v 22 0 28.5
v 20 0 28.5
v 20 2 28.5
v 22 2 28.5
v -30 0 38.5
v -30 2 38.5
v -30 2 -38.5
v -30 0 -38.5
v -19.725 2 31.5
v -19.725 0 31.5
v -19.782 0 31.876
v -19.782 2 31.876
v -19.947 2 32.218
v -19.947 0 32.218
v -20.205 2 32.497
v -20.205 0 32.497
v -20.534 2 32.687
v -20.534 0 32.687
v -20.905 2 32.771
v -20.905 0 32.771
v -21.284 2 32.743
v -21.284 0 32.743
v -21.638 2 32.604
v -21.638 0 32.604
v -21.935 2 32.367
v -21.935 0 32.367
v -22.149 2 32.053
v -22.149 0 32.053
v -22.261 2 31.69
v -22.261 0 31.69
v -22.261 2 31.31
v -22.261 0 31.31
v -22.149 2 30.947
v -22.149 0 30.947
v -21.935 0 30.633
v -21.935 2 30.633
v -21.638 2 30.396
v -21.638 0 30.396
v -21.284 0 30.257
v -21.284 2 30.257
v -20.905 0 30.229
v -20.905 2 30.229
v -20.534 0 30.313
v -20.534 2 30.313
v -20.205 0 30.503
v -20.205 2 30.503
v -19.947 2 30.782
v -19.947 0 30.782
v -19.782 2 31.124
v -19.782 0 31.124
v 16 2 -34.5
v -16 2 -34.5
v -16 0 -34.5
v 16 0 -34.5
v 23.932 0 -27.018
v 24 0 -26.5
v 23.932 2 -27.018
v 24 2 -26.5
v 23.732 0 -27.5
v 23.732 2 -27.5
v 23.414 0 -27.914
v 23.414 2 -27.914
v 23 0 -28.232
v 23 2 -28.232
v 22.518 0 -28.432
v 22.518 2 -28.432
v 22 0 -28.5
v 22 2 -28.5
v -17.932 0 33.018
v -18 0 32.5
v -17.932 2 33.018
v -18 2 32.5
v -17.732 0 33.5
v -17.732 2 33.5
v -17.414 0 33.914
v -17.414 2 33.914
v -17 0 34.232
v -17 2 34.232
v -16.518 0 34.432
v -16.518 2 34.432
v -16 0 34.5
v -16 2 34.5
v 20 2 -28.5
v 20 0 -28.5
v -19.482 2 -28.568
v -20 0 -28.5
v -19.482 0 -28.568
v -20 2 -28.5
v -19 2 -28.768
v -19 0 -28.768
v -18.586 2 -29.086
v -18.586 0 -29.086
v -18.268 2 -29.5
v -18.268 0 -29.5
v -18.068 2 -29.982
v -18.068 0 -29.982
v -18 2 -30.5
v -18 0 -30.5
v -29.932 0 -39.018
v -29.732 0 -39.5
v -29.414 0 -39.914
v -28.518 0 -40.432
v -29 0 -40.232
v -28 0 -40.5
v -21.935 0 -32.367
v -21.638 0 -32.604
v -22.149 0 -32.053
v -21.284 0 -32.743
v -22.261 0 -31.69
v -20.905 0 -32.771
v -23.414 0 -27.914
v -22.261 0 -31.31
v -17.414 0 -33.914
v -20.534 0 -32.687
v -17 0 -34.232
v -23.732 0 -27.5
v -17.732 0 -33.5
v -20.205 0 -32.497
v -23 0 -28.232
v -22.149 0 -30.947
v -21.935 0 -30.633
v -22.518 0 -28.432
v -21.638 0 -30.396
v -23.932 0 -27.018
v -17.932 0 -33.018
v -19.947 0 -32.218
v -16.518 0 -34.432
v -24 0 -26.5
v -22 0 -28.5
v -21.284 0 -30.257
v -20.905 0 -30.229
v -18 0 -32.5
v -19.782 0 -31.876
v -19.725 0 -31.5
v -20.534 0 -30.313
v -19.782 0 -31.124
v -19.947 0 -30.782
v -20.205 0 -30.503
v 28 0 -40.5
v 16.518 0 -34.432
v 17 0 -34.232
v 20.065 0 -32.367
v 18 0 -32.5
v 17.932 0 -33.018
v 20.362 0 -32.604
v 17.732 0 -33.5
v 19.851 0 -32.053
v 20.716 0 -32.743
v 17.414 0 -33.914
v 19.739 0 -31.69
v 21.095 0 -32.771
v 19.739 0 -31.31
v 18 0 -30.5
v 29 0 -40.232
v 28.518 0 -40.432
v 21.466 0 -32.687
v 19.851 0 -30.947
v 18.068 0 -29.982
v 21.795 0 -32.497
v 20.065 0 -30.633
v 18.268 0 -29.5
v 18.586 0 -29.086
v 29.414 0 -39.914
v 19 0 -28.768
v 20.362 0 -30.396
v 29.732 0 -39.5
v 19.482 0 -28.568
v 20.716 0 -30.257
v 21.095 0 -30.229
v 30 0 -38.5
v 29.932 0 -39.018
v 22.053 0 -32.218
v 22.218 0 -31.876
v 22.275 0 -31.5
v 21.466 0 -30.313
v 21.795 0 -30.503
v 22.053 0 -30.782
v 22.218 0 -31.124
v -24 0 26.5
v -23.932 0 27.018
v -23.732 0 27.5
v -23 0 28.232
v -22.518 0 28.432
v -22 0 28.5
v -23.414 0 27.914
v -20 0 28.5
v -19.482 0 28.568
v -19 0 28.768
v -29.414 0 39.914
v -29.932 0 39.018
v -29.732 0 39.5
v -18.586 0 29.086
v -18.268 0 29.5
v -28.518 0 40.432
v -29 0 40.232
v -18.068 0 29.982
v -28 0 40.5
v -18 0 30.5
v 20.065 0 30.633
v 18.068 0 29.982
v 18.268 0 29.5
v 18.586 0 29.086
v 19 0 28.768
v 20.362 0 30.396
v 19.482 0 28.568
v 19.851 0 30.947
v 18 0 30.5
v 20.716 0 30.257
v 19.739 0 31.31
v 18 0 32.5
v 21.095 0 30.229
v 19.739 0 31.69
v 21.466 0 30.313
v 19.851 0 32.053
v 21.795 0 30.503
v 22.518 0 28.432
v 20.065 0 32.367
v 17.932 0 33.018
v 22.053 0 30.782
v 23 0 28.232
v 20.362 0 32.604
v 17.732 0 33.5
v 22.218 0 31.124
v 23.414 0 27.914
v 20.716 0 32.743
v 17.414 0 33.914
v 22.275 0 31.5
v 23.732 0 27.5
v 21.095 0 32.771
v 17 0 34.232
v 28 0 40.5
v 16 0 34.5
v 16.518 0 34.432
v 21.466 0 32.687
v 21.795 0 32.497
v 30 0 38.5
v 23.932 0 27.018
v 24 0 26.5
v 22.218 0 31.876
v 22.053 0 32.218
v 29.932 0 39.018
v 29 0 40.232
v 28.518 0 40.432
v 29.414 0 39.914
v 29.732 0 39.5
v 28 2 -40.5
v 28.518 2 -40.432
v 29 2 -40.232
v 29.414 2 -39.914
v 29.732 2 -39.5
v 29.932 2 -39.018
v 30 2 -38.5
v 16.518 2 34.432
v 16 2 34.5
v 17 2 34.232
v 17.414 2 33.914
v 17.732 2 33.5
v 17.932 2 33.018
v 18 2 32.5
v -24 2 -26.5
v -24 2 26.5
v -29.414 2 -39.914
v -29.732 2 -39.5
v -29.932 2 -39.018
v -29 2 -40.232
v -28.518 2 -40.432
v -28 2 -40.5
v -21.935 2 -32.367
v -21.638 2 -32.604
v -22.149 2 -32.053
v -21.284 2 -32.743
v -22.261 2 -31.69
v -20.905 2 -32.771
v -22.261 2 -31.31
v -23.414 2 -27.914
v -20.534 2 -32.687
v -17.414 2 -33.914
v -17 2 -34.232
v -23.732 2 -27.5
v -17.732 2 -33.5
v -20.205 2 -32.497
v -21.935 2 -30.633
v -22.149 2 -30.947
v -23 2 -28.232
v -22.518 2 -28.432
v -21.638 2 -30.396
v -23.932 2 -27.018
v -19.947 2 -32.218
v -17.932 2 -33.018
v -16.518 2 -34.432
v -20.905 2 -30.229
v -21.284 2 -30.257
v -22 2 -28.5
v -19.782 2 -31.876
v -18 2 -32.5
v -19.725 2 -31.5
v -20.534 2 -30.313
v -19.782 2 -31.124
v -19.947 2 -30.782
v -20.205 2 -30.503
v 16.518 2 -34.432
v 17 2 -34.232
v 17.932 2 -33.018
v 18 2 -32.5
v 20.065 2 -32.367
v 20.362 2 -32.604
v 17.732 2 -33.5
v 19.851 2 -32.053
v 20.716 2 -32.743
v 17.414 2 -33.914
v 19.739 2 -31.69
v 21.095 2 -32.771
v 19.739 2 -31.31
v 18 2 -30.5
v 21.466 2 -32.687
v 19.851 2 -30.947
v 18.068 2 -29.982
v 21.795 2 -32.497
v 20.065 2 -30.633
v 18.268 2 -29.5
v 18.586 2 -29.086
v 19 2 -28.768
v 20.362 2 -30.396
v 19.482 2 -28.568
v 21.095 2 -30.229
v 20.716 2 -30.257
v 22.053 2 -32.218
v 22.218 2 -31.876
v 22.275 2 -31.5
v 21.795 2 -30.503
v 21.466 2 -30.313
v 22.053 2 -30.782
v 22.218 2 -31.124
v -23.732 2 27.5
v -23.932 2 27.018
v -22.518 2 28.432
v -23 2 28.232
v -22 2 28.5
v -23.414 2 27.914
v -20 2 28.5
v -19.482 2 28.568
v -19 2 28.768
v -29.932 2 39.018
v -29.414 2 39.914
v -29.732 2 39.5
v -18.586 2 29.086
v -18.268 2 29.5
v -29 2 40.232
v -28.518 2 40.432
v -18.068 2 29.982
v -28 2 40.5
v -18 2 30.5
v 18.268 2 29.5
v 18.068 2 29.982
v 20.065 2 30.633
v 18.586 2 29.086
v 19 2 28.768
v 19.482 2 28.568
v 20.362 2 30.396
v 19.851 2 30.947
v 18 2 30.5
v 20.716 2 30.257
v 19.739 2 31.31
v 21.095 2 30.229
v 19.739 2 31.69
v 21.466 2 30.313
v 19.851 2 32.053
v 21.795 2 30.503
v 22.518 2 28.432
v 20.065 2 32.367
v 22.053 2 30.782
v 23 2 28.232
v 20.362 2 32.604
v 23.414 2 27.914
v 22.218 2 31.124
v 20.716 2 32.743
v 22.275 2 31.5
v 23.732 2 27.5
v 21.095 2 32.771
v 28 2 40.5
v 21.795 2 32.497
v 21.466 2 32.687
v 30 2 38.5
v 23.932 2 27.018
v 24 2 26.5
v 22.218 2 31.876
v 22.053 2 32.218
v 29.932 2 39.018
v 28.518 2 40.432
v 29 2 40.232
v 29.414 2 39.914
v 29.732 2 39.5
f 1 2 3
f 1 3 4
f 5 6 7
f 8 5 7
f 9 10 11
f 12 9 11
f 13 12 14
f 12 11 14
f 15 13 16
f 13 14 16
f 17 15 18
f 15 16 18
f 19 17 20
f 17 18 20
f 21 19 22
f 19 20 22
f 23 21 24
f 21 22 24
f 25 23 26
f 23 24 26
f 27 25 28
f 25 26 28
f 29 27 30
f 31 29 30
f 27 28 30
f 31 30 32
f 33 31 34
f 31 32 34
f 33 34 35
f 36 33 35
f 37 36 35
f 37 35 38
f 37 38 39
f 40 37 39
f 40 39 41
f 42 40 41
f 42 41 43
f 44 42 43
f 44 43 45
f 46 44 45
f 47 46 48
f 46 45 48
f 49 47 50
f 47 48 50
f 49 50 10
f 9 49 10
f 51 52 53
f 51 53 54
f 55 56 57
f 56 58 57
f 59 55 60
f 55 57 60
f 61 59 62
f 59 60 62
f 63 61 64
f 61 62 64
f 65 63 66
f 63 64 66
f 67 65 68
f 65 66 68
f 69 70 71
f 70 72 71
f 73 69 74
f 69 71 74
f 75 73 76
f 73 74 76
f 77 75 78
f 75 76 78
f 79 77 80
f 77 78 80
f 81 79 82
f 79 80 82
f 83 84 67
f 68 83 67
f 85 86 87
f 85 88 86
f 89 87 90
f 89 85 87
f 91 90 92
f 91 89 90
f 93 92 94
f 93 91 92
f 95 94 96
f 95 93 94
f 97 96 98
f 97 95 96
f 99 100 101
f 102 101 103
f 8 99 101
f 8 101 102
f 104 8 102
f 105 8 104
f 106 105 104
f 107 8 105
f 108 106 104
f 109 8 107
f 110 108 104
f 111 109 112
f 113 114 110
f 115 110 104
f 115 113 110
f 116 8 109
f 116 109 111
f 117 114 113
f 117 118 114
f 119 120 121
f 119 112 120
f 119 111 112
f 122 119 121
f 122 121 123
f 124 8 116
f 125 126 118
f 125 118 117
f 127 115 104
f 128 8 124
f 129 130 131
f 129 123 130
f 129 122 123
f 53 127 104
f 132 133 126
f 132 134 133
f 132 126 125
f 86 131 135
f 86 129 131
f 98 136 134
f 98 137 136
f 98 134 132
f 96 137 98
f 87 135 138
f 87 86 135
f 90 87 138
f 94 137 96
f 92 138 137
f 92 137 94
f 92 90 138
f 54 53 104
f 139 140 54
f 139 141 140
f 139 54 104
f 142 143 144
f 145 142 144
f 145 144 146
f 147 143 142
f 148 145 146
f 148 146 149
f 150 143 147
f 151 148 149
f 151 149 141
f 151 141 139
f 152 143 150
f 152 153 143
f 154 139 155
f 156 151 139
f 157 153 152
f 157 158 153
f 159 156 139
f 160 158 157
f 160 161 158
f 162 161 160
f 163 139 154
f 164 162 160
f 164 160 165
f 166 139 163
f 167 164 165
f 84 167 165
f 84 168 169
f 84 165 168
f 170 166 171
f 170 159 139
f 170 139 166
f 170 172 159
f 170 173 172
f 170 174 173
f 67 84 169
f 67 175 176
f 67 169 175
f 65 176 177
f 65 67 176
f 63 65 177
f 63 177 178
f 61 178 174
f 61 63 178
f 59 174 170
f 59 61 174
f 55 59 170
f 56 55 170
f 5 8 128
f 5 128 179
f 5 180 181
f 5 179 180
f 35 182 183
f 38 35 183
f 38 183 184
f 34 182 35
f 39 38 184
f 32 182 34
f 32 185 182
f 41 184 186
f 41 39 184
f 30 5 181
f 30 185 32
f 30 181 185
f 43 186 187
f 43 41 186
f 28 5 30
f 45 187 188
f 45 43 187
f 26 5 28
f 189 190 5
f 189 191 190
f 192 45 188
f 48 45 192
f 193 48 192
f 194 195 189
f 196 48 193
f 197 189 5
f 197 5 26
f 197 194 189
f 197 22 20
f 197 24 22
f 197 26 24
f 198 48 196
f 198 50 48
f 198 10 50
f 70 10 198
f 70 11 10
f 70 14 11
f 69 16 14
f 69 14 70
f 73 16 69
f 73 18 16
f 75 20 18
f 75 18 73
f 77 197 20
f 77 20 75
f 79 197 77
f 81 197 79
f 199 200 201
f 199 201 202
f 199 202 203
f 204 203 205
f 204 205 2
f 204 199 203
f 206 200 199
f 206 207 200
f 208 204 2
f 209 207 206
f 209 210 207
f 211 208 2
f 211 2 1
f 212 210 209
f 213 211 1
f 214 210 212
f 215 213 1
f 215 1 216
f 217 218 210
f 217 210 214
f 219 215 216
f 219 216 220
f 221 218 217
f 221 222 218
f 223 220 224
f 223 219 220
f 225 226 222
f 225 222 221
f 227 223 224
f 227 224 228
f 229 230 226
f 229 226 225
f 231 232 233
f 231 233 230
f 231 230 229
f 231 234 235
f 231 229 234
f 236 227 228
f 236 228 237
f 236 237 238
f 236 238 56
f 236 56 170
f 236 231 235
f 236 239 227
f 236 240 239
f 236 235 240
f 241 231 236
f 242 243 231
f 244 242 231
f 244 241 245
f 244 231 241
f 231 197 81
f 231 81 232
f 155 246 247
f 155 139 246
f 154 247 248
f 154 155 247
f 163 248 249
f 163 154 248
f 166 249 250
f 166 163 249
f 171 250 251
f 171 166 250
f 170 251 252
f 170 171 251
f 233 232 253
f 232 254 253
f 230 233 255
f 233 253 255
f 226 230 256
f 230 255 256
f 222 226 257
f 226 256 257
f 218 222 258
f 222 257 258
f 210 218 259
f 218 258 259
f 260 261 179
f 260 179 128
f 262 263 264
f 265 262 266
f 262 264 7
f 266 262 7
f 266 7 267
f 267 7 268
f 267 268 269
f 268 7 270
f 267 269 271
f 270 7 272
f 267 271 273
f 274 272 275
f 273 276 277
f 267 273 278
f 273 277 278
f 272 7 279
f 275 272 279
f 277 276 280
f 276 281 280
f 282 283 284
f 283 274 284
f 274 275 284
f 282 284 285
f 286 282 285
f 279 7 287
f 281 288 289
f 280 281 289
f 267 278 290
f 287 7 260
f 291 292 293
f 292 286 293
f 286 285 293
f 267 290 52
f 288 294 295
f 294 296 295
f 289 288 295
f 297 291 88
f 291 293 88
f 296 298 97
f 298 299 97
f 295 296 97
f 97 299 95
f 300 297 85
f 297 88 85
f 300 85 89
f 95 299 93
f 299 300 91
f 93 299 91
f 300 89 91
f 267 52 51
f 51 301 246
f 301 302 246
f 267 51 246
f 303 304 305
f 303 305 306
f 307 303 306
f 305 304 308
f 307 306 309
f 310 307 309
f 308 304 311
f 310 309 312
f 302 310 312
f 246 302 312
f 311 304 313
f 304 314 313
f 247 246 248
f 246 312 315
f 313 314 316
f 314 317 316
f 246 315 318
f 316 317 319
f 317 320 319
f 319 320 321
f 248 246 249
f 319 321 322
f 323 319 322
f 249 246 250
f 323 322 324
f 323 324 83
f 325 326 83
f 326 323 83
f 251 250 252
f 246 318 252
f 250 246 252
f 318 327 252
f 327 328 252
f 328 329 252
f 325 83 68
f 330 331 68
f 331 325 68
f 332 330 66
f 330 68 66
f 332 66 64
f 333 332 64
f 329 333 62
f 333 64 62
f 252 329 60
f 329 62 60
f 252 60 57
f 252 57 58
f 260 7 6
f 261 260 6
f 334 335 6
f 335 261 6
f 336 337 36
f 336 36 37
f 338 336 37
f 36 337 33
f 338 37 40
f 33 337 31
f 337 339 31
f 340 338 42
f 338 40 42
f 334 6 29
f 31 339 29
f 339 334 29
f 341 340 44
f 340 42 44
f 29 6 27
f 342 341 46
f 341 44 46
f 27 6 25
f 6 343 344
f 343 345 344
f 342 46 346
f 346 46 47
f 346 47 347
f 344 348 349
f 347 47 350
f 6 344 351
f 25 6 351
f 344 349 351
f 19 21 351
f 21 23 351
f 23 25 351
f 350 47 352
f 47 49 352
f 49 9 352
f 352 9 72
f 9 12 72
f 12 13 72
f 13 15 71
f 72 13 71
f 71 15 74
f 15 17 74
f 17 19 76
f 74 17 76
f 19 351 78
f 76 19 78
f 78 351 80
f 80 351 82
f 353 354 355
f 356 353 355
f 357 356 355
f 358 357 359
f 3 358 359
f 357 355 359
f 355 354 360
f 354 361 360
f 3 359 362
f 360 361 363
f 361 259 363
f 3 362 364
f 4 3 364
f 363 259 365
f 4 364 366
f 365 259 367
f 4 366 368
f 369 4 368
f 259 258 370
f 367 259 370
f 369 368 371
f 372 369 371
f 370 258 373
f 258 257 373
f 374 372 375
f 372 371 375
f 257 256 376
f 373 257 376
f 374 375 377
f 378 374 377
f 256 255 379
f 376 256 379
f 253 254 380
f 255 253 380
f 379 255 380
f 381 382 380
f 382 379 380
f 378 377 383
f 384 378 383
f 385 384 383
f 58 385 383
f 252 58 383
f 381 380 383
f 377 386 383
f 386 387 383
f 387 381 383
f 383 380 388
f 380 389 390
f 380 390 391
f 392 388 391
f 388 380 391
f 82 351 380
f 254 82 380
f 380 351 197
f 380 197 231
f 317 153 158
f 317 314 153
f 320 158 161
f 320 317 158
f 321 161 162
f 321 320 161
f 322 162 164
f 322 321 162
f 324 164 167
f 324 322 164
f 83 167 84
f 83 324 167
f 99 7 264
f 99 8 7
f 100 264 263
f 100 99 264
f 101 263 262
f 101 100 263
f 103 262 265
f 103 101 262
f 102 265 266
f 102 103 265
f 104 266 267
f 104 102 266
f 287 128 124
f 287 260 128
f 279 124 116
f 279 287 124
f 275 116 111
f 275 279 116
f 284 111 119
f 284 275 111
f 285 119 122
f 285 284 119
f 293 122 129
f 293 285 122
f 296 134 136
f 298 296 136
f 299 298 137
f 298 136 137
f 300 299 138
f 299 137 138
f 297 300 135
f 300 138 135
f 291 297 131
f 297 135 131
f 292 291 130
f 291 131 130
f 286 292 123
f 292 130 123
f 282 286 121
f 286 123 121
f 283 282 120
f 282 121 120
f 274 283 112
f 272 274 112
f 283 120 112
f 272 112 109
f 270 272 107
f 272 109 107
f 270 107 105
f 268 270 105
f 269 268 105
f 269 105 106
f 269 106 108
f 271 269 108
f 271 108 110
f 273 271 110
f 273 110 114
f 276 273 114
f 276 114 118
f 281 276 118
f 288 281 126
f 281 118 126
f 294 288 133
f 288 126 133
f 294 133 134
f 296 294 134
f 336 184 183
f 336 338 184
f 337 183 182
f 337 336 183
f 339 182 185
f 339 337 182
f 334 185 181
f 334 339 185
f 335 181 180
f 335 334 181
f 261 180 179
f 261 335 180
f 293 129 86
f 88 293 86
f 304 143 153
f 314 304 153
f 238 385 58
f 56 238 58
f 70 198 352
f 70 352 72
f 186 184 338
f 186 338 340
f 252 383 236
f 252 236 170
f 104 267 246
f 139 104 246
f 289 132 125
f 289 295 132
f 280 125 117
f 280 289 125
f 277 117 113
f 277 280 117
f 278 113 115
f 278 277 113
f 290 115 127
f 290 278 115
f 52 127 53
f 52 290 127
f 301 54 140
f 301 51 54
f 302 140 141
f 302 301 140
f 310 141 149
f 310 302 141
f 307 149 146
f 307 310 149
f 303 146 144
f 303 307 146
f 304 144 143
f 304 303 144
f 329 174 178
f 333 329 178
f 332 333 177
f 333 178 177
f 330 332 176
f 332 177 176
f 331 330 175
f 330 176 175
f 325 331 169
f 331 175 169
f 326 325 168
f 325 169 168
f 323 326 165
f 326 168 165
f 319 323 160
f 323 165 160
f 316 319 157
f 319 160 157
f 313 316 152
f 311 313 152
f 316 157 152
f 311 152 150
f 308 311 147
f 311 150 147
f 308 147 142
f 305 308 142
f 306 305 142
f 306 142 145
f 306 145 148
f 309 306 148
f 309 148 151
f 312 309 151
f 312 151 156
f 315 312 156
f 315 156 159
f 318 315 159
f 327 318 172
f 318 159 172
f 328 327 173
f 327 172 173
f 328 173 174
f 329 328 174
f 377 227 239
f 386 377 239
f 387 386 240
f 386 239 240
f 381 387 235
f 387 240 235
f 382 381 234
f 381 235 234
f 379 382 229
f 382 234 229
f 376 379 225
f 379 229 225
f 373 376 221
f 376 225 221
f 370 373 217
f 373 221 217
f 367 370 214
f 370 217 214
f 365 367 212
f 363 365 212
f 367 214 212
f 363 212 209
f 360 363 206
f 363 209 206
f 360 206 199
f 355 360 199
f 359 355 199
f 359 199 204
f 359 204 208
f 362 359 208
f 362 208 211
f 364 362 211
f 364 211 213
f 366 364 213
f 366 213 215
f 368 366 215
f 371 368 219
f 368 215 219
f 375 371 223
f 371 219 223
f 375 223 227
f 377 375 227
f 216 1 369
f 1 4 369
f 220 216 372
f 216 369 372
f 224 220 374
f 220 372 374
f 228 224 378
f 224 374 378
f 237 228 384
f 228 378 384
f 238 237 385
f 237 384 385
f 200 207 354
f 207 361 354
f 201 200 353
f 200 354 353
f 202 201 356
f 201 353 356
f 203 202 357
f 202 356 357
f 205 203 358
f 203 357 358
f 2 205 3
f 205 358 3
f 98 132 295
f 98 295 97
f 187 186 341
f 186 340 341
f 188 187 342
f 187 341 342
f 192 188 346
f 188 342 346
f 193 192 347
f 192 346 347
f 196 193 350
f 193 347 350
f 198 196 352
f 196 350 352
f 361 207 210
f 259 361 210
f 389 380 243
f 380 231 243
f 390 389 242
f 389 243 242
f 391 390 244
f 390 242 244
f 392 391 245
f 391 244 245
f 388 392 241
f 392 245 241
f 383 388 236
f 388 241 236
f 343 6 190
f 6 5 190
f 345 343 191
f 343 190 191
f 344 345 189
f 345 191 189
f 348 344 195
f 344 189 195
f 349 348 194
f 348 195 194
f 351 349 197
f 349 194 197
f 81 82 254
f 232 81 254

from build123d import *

# Parameters (mm, degrees)
SKETCH_1_W          = 48
SKETCH_1_H          = 69
EXTRUDE_1_DEPTH     = 2
SKETCH_2_W          = 60
SKETCH_2_H          = 81
EXTRUDE_2_DEPTH     = 2
SKETCH_3_W          = 48
SKETCH_3_H          = 69
CUT_EXTRUDE_1_DEPTH = 2
SKETCH_4_W          = 6
SKETCH_4_H          = 6
EXTRUDE_3_DEPTH     = 2
SKETCH_5_R          = 1.275
CUT_EXTRUDE_2_DEPTH = 2
FILLET_1_R          = 2


with BuildPart() as part:
    # 草图1 → 凸台-拉伸1 (new body)
    with BuildSketch(Plane(origin=(0, 0, 0), x_dir=(1, 0, 0), z_dir=(0, 1, 0))):
        Rectangle(SKETCH_1_W, SKETCH_1_H)
    extrude(amount=EXTRUDE_1_DEPTH)

    # 草图2 → 凸台-拉伸2 (add)
    with BuildSketch(Plane(origin=(0, 2, 0), x_dir=(1, 0, 0), z_dir=(0, 1, 0))):
        Rectangle(SKETCH_2_W, SKETCH_2_H)
    extrude(amount=-EXTRUDE_2_DEPTH)

    # 草图3 → 切除-拉伸1 (cut)
    with BuildSketch(Plane(origin=(0, 2, 0), x_dir=(1, 0, 0), z_dir=(0, 1, 0))):
        Rectangle(SKETCH_3_W, SKETCH_3_H)
    extrude(amount=-CUT_EXTRUDE_1_DEPTH, mode=Mode.SUBTRACT)

    # 草图4 → 凸台-拉伸3 (add)
    with BuildSketch(Plane.XZ):
        with Locations((-21, 31.5)):
            Rectangle(SKETCH_4_W, SKETCH_4_H)
        with Locations((21, 31.5)):
            Rectangle(SKETCH_4_W, SKETCH_4_H)
        with Locations((-21, -31.5)):
            Rectangle(SKETCH_4_W, SKETCH_4_H)
        with Locations((21, -31.5)):
            Rectangle(SKETCH_4_W, SKETCH_4_H)
    extrude(amount=-EXTRUDE_3_DEPTH)

    # 草图5 → 切除-拉伸2 (cut)
    with BuildSketch(Plane.XZ):
        with Locations((-21, 31.5)):
            Circle(SKETCH_5_R)
        with Locations((-21, -31.5)):
            Circle(SKETCH_5_R)
        with Locations((21, -31.5)):
            Circle(SKETCH_5_R)
        with Locations((21, 31.5)):
            Circle(SKETCH_5_R)
    extrude(amount=-CUT_EXTRUDE_2_DEPTH, mode=Mode.SUBTRACT)

    # 圆角1
    fillet_1_edges = [part.edges().sort_by_distance(p)[0] for p in [
        (30, 1, -40.5),
        (-30, 1, -40.5),
        (-30, 1, 40.5),
        (30, 1, 40.5),
        (-24, 1, 28.5),
        (-18, 1, 34.5),
        (-18, 1, 28.5),
        (24, 1, 28.5),
        (18, 1, 28.5),
        (18, 1, 34.5),
        (-24, 1, -28.5),
        (-18, 1, -28.5),
        (-18, 1, -34.5),
        (24, 1, -28.5),
        (18, 1, -34.5),
        (18, 1, -28.5),
    ]]
    fillet(fillet_1_edges, radius=FILLET_1_R)


solid = part.part
